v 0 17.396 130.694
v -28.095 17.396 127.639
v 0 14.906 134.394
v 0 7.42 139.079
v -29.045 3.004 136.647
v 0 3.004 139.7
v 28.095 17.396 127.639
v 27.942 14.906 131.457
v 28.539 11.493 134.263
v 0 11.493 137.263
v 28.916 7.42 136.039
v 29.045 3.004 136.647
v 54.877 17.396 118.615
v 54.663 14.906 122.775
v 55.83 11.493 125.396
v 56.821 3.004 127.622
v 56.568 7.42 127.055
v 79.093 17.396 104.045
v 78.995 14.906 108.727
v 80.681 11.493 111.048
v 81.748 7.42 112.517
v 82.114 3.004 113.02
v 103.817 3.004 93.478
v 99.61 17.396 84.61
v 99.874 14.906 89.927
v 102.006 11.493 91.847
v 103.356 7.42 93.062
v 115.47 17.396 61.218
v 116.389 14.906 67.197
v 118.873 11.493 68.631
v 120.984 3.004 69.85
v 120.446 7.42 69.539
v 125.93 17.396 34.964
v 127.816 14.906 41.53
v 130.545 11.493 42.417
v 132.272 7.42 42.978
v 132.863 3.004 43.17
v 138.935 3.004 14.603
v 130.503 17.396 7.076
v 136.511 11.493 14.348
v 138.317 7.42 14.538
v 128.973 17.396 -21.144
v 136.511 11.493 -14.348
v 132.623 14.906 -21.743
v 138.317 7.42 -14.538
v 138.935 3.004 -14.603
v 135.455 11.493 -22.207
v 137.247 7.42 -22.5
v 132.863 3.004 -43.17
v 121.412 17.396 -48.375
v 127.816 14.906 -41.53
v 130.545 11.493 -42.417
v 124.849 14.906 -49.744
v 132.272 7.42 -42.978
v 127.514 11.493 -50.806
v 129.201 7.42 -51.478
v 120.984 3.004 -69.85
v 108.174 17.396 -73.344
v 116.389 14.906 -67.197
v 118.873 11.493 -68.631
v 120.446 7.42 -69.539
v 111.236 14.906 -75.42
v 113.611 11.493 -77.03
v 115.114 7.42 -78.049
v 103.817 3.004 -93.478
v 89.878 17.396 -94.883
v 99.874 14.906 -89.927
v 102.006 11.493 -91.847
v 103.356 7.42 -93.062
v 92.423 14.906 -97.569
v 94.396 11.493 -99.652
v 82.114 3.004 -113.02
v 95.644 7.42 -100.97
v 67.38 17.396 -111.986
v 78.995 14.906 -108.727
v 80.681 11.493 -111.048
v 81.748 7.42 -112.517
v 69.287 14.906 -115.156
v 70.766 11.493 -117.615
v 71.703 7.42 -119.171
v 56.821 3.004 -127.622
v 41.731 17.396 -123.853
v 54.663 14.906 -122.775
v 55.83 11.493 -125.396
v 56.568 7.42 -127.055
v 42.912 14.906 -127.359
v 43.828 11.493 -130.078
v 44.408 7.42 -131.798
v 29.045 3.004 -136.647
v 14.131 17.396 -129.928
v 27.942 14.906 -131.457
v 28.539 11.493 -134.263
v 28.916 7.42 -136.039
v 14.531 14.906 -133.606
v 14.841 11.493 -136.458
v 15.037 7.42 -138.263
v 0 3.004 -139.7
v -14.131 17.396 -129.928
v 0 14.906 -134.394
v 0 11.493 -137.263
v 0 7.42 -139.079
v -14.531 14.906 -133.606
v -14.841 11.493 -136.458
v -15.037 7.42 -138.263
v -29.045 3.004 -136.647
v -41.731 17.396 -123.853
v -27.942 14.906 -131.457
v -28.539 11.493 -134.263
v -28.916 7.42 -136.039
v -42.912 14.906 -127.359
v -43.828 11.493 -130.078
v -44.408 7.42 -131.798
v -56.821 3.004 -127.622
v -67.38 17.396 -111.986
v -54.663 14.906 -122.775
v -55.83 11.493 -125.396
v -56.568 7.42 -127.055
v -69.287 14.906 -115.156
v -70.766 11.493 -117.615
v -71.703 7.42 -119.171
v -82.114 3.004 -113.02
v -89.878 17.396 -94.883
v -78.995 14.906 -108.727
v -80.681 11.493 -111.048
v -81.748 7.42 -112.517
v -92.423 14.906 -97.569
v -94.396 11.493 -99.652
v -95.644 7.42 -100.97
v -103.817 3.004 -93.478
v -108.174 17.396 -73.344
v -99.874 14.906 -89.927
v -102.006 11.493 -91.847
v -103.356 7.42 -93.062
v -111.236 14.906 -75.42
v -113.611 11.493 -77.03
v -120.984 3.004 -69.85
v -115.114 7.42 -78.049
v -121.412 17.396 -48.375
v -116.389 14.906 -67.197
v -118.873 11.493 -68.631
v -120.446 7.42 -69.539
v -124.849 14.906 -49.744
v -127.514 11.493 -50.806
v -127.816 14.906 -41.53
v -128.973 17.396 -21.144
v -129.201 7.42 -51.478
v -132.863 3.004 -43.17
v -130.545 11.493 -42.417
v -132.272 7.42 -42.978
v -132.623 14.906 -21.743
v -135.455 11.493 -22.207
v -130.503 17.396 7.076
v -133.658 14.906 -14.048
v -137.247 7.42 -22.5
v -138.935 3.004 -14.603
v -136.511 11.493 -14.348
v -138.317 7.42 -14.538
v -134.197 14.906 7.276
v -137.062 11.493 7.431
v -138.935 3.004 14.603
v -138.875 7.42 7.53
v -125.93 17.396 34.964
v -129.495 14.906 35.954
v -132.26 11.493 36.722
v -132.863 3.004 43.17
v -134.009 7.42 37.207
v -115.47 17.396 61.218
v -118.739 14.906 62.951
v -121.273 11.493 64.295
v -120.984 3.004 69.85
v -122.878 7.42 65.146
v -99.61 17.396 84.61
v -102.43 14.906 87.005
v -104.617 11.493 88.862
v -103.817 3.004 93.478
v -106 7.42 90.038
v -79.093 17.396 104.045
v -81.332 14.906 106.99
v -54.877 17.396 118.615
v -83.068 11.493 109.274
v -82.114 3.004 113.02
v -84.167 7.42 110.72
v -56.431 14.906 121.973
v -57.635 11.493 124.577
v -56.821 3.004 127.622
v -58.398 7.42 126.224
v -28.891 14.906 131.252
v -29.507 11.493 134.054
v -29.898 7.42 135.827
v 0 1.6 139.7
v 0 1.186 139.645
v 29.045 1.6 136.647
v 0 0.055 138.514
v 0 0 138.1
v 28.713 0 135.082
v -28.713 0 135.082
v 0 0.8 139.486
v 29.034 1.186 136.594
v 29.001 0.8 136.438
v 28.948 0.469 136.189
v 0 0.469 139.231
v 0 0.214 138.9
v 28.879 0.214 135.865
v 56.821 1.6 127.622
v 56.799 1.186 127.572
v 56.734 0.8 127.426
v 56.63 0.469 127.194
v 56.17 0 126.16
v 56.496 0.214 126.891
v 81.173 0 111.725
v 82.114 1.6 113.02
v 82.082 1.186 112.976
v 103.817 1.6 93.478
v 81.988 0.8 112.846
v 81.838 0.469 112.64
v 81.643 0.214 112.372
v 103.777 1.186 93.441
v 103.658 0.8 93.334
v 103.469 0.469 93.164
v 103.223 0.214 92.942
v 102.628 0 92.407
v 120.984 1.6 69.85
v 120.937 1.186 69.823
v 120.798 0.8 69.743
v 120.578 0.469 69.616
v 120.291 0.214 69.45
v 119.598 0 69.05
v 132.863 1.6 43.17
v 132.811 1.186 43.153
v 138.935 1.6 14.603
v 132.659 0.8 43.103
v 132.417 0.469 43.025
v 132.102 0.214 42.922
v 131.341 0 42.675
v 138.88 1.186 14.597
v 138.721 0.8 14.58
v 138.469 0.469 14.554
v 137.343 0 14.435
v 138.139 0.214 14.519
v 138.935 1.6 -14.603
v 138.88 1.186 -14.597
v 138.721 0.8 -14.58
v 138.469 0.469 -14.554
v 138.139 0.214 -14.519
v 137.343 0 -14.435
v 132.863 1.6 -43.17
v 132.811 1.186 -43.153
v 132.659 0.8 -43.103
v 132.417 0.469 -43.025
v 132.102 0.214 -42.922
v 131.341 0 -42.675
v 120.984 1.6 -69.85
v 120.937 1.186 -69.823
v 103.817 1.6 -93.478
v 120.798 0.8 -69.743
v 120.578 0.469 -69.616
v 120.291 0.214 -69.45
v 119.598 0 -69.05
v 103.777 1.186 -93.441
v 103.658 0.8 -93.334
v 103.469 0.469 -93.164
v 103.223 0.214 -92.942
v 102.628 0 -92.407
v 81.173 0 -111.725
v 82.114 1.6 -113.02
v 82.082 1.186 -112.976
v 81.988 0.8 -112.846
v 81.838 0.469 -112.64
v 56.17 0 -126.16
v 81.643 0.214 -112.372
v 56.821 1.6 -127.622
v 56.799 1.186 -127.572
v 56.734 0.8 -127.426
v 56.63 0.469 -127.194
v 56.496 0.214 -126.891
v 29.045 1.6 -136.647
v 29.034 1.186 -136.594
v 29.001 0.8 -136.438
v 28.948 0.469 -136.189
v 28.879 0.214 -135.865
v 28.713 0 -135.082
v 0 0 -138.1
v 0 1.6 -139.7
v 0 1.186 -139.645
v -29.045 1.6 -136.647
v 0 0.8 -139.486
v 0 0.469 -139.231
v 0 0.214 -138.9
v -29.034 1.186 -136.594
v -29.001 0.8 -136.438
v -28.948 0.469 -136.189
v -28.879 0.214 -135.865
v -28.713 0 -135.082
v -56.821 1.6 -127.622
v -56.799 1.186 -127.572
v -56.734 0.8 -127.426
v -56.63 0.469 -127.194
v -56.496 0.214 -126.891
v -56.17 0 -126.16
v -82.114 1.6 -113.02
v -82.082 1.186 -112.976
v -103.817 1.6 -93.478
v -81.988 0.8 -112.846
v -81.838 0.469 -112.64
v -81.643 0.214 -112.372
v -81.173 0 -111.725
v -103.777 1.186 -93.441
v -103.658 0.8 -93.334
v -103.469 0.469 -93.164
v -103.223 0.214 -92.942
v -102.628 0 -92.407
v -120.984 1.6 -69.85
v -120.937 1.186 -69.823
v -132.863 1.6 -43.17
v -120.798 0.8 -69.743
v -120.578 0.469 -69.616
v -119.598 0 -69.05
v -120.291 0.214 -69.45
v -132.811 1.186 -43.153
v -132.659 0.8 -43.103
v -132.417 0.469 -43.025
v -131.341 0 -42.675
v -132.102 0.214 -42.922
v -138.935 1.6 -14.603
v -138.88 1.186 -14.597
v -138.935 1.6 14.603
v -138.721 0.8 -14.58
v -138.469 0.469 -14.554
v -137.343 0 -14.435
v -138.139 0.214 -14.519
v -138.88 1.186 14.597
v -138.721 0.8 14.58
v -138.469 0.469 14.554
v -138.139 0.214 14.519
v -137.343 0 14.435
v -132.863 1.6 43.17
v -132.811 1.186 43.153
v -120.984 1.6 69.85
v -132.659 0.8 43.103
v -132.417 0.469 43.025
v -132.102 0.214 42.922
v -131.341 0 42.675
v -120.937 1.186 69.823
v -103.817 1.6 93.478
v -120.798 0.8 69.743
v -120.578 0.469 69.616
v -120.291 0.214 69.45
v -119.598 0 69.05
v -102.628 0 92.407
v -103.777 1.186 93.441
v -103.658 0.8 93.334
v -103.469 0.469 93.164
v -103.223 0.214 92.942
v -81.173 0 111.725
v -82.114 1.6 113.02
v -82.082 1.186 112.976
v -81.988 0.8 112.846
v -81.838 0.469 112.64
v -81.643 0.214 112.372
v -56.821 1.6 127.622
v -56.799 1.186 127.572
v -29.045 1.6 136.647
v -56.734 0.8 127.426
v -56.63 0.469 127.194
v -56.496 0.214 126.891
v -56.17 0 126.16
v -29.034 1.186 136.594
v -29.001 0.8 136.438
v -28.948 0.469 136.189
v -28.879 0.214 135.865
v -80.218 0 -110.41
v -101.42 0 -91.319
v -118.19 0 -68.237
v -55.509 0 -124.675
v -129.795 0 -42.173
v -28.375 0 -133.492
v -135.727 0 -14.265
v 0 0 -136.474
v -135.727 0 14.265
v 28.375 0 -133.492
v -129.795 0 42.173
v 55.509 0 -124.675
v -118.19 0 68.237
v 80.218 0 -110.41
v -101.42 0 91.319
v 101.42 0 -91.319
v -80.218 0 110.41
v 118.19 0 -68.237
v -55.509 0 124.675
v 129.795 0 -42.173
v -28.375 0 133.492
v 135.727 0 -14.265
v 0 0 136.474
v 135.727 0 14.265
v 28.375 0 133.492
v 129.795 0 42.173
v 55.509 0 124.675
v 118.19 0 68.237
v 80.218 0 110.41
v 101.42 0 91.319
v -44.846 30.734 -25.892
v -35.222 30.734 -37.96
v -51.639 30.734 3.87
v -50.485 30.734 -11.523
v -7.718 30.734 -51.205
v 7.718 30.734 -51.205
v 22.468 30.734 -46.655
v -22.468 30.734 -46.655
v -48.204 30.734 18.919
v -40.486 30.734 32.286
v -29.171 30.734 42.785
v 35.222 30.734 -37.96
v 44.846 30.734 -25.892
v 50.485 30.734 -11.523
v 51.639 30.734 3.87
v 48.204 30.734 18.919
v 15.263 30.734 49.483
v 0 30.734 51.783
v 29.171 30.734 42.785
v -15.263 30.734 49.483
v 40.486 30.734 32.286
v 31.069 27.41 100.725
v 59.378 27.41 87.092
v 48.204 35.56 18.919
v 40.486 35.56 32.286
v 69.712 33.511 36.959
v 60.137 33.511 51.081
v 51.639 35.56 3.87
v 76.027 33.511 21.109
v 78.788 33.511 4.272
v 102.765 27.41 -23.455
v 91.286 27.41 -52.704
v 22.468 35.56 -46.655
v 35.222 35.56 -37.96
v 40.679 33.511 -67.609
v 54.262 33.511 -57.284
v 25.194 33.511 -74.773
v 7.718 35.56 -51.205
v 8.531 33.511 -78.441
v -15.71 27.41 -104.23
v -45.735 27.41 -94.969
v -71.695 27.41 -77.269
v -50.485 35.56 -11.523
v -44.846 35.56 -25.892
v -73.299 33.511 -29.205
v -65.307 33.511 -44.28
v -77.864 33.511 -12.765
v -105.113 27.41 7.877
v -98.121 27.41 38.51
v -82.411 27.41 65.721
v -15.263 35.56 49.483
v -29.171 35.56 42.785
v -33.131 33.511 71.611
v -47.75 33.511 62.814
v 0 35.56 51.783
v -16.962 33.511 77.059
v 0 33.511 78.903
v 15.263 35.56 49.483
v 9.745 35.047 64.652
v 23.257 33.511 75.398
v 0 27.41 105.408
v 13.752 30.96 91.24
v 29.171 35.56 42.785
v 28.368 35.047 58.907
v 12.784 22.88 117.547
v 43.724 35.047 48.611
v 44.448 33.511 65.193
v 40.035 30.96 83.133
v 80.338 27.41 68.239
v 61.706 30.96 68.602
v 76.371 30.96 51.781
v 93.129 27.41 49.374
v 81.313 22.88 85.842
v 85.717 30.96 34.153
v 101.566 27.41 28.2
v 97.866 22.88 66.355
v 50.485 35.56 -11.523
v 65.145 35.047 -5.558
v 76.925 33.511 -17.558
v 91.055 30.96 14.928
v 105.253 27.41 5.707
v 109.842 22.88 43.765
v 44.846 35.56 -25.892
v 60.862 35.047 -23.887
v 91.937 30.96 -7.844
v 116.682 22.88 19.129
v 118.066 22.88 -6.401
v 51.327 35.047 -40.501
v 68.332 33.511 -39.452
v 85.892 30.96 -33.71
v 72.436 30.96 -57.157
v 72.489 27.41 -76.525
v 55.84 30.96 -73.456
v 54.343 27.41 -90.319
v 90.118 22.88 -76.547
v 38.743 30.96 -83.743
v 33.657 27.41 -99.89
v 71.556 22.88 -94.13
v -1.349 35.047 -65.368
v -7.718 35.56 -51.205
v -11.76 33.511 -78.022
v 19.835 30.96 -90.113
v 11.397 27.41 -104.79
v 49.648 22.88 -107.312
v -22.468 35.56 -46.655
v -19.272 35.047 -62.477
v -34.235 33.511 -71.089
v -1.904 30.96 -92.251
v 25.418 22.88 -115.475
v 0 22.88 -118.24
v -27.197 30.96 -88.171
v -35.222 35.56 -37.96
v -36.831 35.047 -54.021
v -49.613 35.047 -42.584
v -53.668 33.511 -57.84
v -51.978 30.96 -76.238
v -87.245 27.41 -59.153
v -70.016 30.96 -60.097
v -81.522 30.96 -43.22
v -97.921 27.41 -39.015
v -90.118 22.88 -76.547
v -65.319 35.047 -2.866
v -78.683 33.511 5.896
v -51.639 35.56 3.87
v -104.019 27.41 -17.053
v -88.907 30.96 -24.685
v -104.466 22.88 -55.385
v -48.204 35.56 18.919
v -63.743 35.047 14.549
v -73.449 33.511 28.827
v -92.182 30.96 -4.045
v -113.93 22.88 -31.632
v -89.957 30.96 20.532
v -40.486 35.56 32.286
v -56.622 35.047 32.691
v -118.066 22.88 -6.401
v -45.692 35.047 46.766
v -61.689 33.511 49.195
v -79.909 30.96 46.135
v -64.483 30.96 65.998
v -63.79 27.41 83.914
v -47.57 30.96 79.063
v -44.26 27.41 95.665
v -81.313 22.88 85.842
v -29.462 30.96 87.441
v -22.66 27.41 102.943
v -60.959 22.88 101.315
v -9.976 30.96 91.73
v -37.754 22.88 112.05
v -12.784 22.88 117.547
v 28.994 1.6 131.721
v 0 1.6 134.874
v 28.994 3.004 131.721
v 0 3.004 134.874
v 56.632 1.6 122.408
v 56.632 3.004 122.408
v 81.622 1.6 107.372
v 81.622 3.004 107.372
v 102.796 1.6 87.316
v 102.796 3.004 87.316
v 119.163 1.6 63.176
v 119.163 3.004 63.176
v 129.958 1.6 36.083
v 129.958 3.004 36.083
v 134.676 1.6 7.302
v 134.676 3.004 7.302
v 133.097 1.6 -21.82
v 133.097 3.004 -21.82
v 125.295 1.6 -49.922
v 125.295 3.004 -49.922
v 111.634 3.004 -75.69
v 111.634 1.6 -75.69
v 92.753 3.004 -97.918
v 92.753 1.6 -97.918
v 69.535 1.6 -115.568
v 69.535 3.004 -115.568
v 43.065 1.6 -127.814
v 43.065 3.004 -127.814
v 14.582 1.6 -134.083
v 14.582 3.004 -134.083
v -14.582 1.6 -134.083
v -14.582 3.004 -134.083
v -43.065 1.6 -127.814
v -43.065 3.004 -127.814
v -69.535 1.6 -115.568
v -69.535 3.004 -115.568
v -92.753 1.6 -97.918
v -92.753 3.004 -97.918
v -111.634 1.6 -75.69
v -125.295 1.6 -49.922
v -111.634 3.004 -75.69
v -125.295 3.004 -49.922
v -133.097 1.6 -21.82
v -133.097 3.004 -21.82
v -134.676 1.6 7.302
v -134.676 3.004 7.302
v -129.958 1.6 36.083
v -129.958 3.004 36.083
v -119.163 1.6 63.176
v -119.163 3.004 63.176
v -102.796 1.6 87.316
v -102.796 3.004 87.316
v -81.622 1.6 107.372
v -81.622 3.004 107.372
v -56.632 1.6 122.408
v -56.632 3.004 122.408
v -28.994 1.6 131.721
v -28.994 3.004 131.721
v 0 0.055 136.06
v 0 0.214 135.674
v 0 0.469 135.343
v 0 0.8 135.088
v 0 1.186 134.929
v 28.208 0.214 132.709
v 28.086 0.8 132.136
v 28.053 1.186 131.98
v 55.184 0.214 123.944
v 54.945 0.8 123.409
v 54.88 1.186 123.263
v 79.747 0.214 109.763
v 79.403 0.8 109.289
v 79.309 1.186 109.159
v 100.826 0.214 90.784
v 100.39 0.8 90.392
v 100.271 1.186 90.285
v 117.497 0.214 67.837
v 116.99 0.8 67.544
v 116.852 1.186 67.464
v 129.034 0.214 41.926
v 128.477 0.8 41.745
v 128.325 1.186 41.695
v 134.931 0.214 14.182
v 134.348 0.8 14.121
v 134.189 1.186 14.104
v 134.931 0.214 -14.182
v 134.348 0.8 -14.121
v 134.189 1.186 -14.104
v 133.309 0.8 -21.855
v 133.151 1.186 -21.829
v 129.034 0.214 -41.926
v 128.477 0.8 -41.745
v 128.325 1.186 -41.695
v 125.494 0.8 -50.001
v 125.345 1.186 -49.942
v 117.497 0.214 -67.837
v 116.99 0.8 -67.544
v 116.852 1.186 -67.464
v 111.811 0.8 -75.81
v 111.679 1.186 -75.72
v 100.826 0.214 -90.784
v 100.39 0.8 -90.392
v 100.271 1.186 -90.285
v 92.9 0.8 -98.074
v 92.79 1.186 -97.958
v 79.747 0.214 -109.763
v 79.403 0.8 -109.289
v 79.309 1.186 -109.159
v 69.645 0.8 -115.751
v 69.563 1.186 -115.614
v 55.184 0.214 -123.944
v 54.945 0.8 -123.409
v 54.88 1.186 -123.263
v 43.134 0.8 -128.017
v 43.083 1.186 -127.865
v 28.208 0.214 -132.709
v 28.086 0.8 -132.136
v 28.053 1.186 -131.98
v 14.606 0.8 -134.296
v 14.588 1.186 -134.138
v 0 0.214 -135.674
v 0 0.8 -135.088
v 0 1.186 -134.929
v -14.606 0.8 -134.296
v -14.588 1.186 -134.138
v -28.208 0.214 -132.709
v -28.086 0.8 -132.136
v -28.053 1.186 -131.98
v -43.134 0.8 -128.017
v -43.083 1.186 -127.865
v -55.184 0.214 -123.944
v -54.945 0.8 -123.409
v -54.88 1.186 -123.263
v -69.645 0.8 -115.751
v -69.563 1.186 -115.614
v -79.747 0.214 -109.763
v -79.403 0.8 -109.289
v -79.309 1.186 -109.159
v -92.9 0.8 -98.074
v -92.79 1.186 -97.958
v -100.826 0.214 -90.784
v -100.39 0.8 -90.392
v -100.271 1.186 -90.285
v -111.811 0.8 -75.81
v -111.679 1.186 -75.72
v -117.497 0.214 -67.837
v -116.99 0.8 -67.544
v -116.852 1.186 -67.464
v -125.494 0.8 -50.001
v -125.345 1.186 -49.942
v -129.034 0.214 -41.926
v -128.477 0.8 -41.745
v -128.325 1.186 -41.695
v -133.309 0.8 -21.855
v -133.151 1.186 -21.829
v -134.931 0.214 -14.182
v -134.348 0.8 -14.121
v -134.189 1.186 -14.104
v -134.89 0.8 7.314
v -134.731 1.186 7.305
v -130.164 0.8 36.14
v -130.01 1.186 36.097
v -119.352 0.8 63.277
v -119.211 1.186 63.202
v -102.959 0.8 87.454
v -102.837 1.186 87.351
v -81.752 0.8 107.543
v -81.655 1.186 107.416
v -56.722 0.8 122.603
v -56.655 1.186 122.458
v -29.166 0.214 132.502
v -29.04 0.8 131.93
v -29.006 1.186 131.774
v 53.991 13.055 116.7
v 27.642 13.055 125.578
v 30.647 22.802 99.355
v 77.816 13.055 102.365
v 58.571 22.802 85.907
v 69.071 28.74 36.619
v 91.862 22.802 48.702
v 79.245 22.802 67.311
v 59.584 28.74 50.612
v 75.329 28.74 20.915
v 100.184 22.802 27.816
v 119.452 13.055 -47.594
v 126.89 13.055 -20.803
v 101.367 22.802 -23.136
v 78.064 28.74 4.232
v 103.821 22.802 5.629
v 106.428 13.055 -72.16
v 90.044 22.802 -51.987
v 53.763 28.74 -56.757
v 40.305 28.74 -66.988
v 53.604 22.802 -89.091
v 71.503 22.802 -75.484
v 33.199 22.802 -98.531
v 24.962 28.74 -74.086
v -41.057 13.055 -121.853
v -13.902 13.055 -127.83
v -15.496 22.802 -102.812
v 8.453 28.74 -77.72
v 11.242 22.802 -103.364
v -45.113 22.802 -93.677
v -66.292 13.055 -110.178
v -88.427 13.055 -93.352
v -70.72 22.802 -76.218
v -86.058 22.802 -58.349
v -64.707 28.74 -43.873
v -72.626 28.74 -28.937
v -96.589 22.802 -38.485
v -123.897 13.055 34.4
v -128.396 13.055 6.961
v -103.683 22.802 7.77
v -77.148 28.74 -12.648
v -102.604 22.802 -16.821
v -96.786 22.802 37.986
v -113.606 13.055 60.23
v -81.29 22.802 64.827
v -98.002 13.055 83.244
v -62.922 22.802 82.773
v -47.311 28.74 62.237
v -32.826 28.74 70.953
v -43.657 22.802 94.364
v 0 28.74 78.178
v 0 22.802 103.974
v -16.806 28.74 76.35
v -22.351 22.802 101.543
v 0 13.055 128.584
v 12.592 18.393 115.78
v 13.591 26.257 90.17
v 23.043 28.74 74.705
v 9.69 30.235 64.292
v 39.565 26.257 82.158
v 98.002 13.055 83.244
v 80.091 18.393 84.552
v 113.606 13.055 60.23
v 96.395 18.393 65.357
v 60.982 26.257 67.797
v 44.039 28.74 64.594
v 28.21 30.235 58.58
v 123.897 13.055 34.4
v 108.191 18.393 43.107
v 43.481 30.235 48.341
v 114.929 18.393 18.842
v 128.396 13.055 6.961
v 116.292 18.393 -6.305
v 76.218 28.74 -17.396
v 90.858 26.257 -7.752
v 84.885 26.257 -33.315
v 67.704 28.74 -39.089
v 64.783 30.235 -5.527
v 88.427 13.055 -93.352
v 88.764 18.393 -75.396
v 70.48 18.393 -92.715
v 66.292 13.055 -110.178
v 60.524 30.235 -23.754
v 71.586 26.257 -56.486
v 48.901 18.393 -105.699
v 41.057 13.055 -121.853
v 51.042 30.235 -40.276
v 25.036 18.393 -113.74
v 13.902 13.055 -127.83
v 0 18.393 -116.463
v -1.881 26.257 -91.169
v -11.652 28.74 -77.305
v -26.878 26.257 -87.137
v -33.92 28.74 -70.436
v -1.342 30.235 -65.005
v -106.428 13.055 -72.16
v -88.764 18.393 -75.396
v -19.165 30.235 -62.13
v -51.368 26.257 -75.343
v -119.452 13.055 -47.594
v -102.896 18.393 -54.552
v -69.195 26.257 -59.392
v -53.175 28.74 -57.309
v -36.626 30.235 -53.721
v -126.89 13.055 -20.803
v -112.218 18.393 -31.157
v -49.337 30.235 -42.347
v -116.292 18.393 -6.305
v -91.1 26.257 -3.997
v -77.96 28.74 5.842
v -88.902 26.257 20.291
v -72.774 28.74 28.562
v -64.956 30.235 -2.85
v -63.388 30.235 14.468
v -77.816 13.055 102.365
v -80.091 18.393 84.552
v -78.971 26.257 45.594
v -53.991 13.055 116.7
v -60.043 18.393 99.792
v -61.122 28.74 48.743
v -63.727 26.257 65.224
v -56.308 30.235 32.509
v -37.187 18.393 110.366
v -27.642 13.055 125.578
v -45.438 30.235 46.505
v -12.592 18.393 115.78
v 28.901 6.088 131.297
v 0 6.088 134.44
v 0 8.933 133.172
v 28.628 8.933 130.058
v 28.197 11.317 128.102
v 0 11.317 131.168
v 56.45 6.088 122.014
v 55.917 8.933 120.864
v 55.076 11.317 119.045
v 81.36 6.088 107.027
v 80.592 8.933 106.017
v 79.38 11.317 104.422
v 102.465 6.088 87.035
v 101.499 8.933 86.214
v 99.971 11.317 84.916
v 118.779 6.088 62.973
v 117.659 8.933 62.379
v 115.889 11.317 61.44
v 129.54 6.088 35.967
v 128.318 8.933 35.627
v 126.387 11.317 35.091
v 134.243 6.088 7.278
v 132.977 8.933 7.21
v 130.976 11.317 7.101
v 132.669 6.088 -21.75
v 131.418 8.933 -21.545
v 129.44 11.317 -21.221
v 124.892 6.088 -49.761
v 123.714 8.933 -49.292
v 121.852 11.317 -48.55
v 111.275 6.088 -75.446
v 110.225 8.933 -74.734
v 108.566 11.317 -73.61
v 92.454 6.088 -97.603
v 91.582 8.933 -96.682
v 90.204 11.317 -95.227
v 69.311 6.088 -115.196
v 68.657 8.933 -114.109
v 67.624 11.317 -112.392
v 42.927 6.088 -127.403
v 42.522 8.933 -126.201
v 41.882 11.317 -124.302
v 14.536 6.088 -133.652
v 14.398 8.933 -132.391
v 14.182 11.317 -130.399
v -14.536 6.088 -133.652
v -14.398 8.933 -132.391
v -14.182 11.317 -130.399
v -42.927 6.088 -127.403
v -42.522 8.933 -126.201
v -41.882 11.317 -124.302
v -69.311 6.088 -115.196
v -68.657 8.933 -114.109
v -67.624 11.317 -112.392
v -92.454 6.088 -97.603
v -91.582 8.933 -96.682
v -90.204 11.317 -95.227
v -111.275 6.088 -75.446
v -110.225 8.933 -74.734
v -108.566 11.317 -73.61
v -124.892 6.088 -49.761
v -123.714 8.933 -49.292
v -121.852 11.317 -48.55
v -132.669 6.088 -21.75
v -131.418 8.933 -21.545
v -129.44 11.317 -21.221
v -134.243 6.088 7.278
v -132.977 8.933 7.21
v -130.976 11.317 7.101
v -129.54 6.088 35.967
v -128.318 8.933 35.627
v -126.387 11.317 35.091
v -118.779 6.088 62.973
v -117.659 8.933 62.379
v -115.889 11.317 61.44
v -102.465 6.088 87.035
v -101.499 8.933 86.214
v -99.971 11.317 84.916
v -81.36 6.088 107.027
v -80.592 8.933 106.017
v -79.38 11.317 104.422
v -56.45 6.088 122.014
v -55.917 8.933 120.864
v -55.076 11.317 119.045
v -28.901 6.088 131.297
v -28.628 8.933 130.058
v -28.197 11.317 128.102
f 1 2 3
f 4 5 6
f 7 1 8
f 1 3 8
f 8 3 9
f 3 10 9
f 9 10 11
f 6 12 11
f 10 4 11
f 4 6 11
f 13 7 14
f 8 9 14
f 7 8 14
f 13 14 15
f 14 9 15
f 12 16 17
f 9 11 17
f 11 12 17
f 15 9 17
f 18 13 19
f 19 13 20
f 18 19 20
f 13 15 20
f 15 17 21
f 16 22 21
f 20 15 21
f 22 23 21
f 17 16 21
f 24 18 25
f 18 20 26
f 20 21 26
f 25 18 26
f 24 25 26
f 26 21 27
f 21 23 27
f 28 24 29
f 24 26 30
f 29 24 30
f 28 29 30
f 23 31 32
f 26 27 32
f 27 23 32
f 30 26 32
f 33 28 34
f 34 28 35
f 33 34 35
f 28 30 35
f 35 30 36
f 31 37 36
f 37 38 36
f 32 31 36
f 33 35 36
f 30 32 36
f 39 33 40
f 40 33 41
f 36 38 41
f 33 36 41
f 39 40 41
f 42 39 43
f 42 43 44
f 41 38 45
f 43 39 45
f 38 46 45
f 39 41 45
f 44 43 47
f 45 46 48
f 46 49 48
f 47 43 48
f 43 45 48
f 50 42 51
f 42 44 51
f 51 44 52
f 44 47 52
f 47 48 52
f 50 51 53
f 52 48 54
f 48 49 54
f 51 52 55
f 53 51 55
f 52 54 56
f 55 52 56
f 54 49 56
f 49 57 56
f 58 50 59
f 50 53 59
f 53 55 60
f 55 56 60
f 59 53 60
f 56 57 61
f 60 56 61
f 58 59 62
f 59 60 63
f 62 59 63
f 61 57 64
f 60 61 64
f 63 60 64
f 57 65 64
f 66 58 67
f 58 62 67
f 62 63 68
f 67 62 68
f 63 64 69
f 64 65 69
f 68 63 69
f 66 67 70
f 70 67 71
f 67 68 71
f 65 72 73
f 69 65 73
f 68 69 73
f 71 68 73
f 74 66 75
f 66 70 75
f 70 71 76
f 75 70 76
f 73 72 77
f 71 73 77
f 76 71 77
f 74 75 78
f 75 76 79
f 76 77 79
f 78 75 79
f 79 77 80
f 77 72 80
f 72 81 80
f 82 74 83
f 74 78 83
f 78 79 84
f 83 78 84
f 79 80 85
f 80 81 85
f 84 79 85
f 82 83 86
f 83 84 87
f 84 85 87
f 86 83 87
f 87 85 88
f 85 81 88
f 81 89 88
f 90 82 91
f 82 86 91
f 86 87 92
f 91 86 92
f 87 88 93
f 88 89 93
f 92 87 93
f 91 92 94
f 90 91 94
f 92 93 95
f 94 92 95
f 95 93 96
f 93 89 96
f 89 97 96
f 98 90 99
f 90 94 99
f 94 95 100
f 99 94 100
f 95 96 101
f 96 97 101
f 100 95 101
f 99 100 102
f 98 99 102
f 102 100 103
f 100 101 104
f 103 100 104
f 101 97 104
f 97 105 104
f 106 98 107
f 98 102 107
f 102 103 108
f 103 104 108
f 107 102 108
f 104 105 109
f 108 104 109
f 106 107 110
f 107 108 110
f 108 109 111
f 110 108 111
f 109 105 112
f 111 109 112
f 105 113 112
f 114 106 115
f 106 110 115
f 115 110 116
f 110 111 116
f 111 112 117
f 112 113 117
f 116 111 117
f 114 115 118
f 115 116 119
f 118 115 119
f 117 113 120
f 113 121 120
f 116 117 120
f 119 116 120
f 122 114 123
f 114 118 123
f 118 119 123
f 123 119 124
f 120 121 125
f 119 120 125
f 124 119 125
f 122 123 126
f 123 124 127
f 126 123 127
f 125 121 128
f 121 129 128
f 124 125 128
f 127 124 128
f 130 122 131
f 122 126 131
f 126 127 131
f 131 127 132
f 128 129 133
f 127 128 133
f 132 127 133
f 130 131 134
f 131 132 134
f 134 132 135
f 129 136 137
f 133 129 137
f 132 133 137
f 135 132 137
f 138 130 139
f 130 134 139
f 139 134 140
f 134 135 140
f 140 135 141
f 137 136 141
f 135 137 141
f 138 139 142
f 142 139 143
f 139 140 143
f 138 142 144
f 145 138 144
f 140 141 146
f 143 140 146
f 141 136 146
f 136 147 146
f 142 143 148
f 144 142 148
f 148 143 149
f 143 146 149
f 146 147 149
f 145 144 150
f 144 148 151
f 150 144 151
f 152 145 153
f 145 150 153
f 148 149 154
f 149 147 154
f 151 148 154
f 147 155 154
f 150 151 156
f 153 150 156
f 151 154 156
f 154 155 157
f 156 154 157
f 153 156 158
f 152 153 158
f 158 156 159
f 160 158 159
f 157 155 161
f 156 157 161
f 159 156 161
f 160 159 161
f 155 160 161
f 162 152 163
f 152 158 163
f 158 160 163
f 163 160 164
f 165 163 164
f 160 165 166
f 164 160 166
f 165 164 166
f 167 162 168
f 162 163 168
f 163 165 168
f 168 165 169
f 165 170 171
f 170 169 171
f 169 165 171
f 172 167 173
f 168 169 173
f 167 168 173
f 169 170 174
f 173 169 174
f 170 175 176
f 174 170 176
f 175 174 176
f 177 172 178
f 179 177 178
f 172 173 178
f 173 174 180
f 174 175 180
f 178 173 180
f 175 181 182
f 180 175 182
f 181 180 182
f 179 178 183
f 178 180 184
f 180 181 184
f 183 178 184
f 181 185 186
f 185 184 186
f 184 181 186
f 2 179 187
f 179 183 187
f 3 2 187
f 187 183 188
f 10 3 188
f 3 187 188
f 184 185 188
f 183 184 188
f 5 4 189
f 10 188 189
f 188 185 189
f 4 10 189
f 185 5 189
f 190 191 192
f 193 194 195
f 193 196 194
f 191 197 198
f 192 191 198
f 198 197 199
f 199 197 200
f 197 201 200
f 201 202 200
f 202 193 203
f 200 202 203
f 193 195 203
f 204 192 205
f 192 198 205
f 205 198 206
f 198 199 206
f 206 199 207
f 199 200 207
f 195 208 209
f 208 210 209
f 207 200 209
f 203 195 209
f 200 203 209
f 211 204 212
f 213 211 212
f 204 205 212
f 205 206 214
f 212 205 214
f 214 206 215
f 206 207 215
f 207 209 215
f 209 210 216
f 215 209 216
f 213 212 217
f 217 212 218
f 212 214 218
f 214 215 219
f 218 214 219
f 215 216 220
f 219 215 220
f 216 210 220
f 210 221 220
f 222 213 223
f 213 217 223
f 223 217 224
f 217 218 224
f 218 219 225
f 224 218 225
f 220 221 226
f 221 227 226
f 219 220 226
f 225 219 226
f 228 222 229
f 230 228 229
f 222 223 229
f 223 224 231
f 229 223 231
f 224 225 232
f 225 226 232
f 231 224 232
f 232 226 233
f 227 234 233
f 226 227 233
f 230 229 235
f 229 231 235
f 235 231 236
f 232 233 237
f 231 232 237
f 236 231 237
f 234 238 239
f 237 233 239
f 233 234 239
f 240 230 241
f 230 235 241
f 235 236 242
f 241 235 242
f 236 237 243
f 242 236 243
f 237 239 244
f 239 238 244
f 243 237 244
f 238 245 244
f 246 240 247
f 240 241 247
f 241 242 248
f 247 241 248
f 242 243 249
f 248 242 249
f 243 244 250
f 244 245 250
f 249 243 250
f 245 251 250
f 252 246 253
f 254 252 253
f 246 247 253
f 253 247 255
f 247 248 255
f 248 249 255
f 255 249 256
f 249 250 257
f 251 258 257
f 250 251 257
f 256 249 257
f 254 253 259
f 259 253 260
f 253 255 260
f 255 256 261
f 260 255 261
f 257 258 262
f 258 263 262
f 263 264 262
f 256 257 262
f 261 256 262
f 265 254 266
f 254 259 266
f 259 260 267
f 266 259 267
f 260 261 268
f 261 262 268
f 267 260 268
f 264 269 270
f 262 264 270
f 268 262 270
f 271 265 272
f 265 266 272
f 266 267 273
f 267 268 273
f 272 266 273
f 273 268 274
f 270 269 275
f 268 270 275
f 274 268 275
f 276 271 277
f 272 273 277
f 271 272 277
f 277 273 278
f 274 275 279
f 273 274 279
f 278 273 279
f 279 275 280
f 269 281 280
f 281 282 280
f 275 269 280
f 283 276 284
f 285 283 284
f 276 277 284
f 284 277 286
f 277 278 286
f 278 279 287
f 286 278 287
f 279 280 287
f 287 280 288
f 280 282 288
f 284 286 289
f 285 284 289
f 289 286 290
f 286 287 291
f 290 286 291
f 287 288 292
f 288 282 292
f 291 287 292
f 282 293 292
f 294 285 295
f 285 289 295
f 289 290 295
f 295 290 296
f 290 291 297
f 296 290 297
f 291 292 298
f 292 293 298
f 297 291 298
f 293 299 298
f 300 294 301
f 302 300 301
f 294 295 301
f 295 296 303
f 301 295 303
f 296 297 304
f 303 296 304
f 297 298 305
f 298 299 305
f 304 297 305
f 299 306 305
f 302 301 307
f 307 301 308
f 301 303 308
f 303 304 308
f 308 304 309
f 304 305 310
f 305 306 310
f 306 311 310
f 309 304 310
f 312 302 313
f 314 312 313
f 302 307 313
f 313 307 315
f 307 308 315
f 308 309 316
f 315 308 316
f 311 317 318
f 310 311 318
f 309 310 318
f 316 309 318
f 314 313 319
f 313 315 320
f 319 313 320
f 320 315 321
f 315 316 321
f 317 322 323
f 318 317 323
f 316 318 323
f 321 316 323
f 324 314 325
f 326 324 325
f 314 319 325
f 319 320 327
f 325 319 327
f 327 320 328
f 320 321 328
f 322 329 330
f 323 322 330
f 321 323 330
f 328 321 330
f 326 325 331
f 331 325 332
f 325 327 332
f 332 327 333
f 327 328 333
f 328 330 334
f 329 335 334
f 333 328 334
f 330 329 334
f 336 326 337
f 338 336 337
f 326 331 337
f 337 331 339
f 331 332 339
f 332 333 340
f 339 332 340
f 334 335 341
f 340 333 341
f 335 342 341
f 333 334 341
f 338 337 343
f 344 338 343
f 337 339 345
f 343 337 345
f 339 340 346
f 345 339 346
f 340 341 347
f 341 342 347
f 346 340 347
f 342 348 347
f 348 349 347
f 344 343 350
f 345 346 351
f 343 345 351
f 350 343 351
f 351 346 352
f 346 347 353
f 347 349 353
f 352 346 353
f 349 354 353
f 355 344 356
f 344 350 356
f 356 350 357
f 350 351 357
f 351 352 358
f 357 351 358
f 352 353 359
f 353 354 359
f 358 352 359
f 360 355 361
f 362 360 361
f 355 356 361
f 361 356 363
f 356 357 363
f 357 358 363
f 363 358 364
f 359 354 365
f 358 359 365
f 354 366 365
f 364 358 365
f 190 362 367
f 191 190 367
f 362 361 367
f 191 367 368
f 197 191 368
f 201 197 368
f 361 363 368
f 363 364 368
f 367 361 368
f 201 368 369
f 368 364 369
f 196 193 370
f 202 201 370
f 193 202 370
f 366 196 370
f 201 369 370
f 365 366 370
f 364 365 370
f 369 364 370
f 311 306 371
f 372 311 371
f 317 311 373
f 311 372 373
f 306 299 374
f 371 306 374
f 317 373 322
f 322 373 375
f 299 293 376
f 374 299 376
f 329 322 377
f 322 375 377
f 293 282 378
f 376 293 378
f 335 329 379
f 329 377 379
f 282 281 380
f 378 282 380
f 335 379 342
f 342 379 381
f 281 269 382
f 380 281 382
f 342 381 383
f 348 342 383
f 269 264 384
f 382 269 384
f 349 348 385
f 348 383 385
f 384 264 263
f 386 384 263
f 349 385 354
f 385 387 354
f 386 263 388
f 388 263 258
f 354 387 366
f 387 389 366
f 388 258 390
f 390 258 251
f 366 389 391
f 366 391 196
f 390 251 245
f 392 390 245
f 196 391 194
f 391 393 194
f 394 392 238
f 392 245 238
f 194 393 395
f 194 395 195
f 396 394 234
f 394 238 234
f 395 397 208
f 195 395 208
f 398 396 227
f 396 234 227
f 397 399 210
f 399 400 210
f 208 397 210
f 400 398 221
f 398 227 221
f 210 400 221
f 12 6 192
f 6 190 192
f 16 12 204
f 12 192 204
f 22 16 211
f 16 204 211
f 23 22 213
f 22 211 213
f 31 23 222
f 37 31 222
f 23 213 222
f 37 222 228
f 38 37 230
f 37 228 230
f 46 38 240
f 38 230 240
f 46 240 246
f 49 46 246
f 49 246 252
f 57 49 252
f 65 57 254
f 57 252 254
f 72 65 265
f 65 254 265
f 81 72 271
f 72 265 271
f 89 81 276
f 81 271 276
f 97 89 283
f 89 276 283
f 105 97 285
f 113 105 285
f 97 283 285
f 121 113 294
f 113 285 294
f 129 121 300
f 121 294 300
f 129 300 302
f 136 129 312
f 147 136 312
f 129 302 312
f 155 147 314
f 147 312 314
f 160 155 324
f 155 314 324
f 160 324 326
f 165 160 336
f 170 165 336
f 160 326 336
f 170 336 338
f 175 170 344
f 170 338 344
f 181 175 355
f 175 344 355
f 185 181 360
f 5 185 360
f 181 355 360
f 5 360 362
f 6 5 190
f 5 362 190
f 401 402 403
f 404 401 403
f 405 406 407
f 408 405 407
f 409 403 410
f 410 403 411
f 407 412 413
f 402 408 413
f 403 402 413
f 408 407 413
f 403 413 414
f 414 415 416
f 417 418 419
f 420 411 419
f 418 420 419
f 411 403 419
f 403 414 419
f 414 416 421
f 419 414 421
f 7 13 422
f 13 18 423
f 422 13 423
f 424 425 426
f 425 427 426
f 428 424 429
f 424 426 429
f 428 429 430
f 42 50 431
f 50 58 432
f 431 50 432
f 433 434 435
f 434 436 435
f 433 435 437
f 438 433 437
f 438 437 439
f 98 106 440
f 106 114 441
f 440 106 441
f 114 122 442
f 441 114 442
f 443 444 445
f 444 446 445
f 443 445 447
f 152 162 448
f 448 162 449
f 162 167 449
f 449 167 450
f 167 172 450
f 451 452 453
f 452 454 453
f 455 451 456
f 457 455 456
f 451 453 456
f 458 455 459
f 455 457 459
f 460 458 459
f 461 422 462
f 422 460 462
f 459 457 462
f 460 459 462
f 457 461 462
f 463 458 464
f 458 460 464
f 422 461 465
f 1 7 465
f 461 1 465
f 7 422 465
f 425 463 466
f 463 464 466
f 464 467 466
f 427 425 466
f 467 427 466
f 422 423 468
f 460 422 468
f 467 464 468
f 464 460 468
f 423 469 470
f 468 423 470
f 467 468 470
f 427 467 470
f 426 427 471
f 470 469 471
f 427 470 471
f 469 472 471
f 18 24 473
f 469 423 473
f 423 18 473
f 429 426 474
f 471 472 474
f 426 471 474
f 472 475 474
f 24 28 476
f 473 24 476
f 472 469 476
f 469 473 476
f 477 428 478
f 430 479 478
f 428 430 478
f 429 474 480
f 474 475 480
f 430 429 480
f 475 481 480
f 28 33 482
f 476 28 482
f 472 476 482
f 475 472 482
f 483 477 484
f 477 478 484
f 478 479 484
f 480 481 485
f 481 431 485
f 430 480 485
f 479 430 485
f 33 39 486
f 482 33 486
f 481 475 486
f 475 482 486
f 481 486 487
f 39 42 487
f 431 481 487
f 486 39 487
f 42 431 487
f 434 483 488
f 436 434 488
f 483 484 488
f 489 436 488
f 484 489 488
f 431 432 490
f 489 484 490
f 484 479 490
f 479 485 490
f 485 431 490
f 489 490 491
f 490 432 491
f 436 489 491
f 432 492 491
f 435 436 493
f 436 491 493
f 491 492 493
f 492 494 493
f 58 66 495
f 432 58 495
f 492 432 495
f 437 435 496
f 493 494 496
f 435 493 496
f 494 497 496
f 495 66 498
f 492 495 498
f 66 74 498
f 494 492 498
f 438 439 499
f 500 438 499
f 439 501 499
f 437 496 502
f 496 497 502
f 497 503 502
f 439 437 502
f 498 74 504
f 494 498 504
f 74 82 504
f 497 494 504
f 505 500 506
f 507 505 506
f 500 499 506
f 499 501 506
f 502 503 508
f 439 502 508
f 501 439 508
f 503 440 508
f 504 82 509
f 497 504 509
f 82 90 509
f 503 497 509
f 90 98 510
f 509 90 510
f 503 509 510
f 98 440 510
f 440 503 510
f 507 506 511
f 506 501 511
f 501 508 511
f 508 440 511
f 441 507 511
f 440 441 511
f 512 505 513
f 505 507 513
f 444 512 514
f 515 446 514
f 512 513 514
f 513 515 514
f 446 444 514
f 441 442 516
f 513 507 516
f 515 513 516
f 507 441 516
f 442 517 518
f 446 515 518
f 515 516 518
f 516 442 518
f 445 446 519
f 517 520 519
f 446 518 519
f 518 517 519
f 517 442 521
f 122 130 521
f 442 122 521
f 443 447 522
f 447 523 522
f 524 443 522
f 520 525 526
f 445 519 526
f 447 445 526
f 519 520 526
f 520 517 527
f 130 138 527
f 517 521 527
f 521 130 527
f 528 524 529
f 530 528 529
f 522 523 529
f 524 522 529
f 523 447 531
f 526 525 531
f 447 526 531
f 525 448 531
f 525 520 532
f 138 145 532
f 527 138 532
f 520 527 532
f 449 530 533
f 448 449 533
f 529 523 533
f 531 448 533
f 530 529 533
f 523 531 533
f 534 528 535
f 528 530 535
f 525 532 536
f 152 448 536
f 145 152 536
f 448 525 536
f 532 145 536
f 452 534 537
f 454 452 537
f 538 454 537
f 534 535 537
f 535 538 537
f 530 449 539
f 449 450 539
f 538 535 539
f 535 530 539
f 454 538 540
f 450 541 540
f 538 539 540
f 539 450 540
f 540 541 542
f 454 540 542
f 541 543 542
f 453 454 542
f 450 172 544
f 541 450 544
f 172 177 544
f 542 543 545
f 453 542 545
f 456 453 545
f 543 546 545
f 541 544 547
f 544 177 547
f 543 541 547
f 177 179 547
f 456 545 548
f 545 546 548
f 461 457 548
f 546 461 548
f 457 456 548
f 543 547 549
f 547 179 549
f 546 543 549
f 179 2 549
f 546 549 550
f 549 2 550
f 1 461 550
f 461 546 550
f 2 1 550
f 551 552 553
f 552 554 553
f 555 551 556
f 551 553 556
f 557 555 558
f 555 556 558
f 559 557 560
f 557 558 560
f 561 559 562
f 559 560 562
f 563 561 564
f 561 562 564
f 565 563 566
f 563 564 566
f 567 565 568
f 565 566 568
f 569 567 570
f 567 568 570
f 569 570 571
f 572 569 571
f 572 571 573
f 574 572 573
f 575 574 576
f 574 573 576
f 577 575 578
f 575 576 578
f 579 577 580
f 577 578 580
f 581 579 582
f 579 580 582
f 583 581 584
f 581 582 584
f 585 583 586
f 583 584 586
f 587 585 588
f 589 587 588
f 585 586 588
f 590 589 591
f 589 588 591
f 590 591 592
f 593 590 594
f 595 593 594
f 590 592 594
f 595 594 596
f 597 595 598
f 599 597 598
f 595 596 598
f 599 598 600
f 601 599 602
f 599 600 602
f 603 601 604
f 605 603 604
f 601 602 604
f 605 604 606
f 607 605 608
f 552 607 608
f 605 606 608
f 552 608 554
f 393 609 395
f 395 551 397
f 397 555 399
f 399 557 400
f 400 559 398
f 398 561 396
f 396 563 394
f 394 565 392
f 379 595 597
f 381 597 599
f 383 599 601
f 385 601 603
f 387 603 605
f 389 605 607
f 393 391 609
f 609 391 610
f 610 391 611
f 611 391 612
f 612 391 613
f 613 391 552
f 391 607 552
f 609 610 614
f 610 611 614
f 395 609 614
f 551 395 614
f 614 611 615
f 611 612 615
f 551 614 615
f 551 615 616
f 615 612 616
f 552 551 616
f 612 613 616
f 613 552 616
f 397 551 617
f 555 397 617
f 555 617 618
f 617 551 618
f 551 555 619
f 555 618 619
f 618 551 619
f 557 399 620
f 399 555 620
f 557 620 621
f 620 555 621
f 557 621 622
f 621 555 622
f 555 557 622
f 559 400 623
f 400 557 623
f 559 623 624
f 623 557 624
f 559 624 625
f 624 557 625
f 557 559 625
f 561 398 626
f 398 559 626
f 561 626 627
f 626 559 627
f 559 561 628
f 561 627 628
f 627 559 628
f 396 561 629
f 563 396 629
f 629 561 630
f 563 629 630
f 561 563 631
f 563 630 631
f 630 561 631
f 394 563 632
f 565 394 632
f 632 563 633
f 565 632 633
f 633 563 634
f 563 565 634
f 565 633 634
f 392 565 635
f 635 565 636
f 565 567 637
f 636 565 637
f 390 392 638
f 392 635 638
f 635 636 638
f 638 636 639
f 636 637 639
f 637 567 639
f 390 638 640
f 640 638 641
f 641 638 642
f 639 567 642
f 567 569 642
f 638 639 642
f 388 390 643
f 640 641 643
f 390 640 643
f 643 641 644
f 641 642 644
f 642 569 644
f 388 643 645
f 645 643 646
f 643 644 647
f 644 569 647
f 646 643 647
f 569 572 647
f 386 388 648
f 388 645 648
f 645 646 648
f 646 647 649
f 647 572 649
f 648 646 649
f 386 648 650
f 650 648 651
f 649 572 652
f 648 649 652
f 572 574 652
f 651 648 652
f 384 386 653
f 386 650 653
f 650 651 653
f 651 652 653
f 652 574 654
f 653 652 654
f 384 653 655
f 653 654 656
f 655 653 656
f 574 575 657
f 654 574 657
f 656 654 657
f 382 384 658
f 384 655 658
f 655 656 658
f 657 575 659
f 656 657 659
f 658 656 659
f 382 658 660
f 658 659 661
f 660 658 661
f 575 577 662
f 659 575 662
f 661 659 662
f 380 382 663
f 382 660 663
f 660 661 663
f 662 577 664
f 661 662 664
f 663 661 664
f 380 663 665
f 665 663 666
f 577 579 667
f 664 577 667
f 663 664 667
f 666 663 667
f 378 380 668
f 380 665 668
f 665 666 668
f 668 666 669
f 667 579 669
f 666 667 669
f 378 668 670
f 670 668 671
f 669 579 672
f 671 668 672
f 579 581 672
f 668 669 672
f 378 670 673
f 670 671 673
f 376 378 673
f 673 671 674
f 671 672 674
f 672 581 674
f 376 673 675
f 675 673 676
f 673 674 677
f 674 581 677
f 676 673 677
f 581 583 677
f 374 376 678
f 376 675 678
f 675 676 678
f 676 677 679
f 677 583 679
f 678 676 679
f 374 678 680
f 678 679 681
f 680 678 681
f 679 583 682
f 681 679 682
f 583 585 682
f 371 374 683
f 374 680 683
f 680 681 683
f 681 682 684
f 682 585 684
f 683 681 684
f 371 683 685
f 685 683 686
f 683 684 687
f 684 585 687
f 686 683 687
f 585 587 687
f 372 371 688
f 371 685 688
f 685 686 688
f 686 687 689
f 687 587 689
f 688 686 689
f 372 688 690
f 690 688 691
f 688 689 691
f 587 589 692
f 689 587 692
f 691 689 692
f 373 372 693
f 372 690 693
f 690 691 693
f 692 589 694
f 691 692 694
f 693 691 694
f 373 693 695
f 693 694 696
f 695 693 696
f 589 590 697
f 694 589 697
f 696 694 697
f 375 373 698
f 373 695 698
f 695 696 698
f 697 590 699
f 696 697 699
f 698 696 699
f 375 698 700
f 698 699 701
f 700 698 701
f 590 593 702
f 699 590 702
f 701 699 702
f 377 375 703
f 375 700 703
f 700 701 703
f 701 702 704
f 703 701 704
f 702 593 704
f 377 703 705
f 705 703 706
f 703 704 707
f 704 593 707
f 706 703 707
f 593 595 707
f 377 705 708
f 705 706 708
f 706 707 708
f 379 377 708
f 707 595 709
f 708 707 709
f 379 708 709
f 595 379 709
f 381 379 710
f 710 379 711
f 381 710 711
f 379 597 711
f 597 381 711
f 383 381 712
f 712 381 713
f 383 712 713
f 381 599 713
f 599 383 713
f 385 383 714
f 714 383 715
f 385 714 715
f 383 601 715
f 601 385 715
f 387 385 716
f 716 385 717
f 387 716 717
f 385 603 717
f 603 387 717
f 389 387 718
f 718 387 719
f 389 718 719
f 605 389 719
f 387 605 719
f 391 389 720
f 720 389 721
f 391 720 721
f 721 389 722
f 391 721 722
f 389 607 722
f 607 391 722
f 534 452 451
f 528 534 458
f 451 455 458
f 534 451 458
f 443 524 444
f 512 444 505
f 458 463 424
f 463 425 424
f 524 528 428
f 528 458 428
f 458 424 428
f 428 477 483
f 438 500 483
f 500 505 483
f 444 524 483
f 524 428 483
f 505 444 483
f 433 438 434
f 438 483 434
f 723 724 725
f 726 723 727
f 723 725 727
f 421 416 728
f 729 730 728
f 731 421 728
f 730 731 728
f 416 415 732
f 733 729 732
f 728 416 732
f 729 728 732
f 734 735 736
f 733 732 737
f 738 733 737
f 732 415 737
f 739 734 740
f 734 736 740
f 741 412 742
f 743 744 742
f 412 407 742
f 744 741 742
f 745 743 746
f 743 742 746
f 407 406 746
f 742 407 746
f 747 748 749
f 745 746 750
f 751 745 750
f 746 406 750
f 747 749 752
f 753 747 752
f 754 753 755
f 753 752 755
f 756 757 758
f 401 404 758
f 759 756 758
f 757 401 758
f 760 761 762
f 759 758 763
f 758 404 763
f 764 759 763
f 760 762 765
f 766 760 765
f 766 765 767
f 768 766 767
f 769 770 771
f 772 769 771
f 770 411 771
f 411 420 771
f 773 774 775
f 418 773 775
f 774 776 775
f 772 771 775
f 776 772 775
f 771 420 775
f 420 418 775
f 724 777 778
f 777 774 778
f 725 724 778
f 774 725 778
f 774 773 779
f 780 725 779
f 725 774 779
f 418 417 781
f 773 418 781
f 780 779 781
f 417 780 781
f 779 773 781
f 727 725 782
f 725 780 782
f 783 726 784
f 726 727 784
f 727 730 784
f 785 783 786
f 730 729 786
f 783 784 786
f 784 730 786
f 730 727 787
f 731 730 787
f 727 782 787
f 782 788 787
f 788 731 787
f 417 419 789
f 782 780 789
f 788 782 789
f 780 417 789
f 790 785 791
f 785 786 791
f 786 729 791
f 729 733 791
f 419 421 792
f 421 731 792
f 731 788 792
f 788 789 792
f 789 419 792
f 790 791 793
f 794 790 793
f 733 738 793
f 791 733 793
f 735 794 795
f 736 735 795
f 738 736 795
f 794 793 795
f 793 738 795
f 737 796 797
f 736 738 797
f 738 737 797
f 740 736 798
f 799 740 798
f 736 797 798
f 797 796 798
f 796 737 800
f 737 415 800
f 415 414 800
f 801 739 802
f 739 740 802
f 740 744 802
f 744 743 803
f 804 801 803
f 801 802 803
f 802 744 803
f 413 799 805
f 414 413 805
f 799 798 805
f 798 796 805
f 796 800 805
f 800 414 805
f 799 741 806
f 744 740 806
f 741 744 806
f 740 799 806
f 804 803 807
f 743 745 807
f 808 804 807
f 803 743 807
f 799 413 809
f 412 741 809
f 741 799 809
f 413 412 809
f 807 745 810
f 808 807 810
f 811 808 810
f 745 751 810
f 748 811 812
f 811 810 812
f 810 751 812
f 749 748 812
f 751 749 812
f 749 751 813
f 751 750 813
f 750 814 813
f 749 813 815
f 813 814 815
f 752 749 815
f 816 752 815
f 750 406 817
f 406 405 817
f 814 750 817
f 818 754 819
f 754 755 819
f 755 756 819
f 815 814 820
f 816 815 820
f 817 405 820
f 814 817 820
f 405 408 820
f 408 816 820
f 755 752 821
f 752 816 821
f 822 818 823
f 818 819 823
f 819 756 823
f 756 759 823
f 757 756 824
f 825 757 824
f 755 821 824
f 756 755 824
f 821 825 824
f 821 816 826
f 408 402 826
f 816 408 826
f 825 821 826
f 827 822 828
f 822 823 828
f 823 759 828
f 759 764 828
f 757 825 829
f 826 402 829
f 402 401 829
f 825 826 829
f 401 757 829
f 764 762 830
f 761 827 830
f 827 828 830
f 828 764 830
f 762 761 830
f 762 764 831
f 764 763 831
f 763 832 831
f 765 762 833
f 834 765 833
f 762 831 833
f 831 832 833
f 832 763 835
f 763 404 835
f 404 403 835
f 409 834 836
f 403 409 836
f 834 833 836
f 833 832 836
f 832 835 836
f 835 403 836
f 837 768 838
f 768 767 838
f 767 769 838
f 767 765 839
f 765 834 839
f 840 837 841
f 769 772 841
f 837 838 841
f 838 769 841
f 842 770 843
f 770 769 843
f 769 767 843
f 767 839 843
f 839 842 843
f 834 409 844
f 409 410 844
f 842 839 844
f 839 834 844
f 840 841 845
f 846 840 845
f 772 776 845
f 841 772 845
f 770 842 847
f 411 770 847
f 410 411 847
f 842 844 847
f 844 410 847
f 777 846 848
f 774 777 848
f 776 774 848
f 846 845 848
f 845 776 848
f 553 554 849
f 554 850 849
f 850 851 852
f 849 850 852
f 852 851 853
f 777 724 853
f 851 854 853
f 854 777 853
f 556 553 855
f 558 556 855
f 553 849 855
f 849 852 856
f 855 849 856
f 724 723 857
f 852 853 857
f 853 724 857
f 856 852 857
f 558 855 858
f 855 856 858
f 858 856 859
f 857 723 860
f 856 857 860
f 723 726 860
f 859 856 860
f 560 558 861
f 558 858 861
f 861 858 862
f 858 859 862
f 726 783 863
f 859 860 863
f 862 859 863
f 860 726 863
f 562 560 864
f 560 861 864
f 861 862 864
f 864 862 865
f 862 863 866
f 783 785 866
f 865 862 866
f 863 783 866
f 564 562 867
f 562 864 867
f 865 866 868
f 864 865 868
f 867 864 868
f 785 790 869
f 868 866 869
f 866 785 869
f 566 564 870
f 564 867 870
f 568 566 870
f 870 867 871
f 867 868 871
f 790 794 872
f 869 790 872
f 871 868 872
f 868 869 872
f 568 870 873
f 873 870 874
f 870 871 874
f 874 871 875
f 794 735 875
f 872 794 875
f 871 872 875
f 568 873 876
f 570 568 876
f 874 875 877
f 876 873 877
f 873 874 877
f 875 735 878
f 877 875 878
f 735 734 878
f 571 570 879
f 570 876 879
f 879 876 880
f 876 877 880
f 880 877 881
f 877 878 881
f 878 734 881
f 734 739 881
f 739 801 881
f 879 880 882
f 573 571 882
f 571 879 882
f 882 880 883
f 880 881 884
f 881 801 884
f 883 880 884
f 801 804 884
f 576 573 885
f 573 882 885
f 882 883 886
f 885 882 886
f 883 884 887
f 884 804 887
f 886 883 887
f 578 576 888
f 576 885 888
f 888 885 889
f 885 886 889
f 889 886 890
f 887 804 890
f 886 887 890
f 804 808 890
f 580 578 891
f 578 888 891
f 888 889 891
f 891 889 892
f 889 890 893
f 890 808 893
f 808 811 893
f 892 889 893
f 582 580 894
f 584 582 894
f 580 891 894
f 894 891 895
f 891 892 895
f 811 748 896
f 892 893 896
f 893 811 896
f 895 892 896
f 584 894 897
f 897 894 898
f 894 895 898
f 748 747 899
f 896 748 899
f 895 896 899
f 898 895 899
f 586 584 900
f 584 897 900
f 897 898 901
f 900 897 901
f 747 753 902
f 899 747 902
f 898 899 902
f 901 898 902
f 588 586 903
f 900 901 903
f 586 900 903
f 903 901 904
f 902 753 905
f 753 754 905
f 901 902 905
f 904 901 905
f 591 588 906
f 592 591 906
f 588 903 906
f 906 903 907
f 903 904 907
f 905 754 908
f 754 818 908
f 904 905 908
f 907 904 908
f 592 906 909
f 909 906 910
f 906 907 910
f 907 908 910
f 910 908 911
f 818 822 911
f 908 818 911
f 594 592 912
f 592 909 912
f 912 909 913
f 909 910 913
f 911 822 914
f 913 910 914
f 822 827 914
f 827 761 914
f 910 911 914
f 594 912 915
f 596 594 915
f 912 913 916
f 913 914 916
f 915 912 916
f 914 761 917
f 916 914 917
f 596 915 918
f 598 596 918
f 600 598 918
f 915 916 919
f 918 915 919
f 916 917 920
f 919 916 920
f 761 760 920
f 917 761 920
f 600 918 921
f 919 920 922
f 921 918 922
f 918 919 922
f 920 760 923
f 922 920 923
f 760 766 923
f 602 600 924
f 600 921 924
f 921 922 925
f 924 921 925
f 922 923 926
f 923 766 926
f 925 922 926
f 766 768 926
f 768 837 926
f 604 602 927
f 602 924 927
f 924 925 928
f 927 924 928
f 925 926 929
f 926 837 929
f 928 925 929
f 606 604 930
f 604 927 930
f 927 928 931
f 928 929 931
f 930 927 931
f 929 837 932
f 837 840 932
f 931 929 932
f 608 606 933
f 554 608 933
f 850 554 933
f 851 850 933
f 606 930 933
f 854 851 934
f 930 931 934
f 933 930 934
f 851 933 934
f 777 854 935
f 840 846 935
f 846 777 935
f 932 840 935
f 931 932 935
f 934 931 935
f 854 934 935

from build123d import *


with BuildPart() as part:
    # Sketch1 → Revolve1 (revolve)
    with BuildSketch(Plane(origin=(0, 0, 0), x_dir=(-1, 0, 0), z_dir=(0, 0, -1)), mode=Mode.PRIVATE) as revolve1_sk:
        with BuildLine():
            Line((-51.783358403, 30.734), (0, 30.734))
            Line((0, 30.734), (0, 35.56))
            Line((0, 35.56), (-51.783358403, 35.56))
            ThreePointArc((-51.783358403, 35.56), (-92.270582842, 30.960327151), (-130.694203117, 17.39575056))
            ThreePointArc((-130.694203117, 17.39575056), (-137.262977816, 11.492729559), (-139.7, 3.004185463))
            Line((-139.7, 3.004185463), (-139.7, 1.6002))
            ThreePointArc((-139.7, 1.6002), (-139.231312271, 0.468687729), (-138.0998, 0))
            Line((-138.0998, 0), (-136.4742, 0))
            ThreePointArc((-136.4742, 0), (-135.342687729, 0.468687729), (-134.874, 1.6002))
            Line((-134.874, 1.6002), (-134.874, 3.004185463))
            ThreePointArc((-134.874, 3.004185463), (-133.17195276, 8.932692451), (-128.584237098, 13.055437277))
            ThreePointArc((-128.584237098, 13.055437277), (-91.188010883, 26.257315993), (-51.783358403, 30.734))
        make_face()
    revolve(revolve1_sk.sketch.rotate(Axis((0, 0, 0), (0, 1, 0)), 270), axis=Axis((0, 0, 0), (0, 1, 0)))


solid = part.part
